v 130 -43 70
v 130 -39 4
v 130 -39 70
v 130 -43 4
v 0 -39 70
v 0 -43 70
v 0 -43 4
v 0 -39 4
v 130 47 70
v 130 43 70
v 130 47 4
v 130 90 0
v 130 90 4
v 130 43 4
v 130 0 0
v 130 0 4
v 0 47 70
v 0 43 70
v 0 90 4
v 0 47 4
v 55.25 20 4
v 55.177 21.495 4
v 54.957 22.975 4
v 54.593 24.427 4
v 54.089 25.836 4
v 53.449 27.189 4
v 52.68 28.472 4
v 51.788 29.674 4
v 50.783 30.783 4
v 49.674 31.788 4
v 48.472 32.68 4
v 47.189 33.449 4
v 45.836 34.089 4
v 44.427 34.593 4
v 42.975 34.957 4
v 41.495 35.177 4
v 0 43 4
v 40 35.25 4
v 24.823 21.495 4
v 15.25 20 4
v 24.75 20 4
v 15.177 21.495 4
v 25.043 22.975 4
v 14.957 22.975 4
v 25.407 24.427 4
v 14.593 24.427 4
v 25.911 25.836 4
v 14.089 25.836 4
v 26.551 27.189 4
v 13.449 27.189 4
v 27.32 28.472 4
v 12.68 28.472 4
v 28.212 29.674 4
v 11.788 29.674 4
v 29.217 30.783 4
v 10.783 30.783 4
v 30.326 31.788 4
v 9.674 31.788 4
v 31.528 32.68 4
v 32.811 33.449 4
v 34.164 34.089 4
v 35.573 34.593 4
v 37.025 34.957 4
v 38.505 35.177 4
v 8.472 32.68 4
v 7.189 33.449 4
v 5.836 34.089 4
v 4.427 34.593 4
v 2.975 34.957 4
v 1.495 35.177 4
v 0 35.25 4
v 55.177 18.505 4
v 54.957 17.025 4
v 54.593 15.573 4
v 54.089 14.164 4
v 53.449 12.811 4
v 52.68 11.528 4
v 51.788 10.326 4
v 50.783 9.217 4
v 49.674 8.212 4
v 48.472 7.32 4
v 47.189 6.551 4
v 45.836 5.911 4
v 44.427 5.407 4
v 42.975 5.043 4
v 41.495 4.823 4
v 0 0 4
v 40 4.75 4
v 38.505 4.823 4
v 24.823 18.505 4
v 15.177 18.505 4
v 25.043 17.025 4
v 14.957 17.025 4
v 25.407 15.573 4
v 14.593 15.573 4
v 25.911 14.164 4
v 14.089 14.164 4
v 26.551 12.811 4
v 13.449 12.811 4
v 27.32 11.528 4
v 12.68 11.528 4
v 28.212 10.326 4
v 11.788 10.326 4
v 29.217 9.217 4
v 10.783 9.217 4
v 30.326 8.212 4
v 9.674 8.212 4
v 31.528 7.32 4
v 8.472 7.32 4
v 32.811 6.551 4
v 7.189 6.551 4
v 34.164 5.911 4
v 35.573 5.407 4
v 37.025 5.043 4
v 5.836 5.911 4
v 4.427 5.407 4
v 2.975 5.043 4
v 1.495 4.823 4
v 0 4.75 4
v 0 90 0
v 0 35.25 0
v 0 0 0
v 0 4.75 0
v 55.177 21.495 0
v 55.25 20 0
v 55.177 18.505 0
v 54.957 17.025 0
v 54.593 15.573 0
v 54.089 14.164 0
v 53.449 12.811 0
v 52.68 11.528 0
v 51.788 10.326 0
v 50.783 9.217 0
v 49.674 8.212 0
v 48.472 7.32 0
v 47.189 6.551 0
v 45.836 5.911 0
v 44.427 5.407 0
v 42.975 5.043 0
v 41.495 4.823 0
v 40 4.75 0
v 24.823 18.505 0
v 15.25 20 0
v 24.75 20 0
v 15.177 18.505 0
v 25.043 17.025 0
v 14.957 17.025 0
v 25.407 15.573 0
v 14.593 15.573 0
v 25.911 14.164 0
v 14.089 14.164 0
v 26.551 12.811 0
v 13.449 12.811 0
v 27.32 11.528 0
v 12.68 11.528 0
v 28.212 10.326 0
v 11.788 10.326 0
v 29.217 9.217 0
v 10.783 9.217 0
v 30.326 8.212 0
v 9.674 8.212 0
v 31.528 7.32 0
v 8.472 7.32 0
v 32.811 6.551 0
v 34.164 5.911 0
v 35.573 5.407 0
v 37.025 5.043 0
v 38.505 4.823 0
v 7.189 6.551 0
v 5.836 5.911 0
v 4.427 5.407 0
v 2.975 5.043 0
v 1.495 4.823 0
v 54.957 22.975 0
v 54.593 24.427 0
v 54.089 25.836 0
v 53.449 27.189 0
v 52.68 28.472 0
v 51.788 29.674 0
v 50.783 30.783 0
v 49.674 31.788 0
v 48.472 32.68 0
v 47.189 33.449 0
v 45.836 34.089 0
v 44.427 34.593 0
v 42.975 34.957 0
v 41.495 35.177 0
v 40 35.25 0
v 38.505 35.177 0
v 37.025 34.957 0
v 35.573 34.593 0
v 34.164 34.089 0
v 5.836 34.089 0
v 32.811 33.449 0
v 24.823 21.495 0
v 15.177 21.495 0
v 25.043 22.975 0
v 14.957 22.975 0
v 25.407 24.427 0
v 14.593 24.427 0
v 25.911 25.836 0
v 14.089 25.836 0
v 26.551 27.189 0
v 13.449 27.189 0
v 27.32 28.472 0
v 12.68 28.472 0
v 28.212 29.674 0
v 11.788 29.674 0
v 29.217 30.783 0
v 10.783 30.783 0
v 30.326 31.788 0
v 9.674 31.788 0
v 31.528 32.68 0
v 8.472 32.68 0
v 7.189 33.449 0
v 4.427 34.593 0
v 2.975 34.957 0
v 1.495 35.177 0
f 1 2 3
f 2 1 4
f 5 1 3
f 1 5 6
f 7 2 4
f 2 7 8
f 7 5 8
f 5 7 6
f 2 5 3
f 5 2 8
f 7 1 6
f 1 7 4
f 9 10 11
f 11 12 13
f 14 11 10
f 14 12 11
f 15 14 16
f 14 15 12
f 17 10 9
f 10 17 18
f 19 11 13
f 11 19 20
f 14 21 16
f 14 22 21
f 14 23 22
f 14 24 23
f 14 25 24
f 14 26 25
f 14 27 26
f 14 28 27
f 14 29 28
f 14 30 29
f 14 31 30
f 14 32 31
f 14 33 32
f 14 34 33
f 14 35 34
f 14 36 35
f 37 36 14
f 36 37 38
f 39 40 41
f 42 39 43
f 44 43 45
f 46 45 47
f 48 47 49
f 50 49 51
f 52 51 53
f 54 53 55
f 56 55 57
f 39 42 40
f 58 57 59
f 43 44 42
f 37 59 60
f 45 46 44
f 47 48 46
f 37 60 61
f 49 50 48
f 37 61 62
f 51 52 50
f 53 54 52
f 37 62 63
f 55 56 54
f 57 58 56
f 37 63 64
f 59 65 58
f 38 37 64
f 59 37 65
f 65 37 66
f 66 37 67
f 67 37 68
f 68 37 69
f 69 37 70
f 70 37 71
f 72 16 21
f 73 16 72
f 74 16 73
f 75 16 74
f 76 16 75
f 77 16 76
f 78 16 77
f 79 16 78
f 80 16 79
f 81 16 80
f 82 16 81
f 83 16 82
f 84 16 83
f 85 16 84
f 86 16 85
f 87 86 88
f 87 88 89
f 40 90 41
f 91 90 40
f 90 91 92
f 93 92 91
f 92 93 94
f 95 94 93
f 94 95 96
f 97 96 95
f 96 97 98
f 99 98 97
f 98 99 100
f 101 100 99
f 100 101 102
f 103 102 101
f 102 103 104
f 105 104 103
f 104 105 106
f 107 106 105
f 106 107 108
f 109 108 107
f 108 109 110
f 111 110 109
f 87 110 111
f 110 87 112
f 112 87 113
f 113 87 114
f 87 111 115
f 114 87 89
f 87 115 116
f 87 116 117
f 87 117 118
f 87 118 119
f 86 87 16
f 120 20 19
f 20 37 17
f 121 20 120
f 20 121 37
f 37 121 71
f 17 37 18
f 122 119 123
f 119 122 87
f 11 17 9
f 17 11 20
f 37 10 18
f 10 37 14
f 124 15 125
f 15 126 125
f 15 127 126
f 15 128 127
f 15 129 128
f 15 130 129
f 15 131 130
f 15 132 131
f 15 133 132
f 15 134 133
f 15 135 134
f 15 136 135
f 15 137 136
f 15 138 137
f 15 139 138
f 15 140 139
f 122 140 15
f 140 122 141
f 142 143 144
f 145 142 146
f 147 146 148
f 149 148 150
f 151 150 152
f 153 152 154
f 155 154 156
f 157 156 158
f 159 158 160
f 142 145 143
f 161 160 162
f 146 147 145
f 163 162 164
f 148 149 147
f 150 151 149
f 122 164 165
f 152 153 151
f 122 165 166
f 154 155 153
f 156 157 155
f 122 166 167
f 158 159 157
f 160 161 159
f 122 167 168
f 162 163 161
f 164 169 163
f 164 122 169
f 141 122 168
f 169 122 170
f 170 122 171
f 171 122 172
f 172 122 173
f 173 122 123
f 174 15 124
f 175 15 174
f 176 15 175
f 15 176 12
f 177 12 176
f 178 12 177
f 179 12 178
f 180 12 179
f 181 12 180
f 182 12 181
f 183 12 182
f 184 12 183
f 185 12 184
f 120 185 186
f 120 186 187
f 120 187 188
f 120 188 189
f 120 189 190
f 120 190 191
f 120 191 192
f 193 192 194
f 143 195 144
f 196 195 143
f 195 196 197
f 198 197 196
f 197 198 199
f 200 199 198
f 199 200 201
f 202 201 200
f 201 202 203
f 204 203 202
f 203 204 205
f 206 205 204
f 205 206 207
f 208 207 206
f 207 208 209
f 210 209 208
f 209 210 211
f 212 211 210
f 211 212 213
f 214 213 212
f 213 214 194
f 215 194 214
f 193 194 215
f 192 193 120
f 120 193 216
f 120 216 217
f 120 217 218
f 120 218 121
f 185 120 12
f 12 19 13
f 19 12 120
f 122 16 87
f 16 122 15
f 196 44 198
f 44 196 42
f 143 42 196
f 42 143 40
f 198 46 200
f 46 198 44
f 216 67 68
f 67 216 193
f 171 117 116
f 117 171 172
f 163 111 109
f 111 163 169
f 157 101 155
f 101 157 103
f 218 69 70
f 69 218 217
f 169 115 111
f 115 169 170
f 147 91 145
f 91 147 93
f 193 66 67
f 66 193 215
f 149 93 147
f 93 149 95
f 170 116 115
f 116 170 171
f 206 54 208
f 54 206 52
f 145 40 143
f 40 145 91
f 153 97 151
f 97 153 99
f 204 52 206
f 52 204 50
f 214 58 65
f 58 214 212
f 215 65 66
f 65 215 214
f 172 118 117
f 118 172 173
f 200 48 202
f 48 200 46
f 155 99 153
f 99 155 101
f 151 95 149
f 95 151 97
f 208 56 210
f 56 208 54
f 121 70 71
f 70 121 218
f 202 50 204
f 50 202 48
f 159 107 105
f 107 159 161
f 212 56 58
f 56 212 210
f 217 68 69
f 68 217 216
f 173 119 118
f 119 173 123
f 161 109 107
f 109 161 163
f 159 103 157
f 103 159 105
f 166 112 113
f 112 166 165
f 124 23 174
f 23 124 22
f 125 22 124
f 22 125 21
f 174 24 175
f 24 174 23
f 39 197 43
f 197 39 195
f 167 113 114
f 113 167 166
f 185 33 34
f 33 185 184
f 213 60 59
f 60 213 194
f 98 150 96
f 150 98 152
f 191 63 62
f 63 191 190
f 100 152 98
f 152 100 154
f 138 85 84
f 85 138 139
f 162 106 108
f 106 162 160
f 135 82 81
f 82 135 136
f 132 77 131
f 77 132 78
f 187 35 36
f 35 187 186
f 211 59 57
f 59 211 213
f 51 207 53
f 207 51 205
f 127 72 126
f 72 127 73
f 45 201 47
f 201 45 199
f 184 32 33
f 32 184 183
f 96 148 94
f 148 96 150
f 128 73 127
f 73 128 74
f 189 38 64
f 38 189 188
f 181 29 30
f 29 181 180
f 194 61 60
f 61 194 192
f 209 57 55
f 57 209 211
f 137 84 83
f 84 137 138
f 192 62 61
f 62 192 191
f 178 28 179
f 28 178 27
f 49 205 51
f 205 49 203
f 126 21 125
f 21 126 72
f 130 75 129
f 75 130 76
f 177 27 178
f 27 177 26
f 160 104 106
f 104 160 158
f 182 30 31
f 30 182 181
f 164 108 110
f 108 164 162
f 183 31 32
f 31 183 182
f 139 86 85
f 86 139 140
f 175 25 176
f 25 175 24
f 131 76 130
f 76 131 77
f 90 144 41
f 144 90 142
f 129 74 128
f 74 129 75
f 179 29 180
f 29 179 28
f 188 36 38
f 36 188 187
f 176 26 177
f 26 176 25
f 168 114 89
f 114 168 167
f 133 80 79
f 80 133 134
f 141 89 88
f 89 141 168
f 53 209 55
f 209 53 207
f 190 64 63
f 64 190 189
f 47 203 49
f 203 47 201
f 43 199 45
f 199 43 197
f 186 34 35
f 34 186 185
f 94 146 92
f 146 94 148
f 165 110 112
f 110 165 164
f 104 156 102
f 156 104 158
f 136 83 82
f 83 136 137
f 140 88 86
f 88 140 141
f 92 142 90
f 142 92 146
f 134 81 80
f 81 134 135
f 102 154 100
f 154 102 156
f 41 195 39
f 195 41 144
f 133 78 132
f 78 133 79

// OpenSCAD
// Plate dimensions
plate_x = 130;        // X length
plate_y = 90;         // Y length
plate_z = 4;          // Thickness

// Hole dimensions
hole_dia = 30.5;      // Diameter
hole_spacing_x = 40;  // Centre-to-centre spacing in X
hole_spacing_y = 40;  // Centre-to-centre spacing in Y

// Wall dimensions
wall_len = 130;       // Length along X
wall_thick = 4;       // Thickness along Y
wall_height = 70;     // Total height from bed

// Build the solid body (plate + walls)
difference() {
    union() {
        cube([plate_x, plate_y, plate_z]);
        for (y = [-plate_y/2 + wall_thick/2, plate_y/2 - wall_thick/2]) {
            translate([0, y, plate_z])
            cube([wall_len, wall_thick, wall_height - plate_z]);
        }
    }
    for (x = [-hole_spacing_x, 0, hole_spacing_x]) {
        for (y = [-hole_spacing_y/2, hole_spacing_y/2]) {
            translate([x, y, -1])
            cylinder(h=plate_z + 2, d=hole_dia, $fn=64);
        }
    }
}
